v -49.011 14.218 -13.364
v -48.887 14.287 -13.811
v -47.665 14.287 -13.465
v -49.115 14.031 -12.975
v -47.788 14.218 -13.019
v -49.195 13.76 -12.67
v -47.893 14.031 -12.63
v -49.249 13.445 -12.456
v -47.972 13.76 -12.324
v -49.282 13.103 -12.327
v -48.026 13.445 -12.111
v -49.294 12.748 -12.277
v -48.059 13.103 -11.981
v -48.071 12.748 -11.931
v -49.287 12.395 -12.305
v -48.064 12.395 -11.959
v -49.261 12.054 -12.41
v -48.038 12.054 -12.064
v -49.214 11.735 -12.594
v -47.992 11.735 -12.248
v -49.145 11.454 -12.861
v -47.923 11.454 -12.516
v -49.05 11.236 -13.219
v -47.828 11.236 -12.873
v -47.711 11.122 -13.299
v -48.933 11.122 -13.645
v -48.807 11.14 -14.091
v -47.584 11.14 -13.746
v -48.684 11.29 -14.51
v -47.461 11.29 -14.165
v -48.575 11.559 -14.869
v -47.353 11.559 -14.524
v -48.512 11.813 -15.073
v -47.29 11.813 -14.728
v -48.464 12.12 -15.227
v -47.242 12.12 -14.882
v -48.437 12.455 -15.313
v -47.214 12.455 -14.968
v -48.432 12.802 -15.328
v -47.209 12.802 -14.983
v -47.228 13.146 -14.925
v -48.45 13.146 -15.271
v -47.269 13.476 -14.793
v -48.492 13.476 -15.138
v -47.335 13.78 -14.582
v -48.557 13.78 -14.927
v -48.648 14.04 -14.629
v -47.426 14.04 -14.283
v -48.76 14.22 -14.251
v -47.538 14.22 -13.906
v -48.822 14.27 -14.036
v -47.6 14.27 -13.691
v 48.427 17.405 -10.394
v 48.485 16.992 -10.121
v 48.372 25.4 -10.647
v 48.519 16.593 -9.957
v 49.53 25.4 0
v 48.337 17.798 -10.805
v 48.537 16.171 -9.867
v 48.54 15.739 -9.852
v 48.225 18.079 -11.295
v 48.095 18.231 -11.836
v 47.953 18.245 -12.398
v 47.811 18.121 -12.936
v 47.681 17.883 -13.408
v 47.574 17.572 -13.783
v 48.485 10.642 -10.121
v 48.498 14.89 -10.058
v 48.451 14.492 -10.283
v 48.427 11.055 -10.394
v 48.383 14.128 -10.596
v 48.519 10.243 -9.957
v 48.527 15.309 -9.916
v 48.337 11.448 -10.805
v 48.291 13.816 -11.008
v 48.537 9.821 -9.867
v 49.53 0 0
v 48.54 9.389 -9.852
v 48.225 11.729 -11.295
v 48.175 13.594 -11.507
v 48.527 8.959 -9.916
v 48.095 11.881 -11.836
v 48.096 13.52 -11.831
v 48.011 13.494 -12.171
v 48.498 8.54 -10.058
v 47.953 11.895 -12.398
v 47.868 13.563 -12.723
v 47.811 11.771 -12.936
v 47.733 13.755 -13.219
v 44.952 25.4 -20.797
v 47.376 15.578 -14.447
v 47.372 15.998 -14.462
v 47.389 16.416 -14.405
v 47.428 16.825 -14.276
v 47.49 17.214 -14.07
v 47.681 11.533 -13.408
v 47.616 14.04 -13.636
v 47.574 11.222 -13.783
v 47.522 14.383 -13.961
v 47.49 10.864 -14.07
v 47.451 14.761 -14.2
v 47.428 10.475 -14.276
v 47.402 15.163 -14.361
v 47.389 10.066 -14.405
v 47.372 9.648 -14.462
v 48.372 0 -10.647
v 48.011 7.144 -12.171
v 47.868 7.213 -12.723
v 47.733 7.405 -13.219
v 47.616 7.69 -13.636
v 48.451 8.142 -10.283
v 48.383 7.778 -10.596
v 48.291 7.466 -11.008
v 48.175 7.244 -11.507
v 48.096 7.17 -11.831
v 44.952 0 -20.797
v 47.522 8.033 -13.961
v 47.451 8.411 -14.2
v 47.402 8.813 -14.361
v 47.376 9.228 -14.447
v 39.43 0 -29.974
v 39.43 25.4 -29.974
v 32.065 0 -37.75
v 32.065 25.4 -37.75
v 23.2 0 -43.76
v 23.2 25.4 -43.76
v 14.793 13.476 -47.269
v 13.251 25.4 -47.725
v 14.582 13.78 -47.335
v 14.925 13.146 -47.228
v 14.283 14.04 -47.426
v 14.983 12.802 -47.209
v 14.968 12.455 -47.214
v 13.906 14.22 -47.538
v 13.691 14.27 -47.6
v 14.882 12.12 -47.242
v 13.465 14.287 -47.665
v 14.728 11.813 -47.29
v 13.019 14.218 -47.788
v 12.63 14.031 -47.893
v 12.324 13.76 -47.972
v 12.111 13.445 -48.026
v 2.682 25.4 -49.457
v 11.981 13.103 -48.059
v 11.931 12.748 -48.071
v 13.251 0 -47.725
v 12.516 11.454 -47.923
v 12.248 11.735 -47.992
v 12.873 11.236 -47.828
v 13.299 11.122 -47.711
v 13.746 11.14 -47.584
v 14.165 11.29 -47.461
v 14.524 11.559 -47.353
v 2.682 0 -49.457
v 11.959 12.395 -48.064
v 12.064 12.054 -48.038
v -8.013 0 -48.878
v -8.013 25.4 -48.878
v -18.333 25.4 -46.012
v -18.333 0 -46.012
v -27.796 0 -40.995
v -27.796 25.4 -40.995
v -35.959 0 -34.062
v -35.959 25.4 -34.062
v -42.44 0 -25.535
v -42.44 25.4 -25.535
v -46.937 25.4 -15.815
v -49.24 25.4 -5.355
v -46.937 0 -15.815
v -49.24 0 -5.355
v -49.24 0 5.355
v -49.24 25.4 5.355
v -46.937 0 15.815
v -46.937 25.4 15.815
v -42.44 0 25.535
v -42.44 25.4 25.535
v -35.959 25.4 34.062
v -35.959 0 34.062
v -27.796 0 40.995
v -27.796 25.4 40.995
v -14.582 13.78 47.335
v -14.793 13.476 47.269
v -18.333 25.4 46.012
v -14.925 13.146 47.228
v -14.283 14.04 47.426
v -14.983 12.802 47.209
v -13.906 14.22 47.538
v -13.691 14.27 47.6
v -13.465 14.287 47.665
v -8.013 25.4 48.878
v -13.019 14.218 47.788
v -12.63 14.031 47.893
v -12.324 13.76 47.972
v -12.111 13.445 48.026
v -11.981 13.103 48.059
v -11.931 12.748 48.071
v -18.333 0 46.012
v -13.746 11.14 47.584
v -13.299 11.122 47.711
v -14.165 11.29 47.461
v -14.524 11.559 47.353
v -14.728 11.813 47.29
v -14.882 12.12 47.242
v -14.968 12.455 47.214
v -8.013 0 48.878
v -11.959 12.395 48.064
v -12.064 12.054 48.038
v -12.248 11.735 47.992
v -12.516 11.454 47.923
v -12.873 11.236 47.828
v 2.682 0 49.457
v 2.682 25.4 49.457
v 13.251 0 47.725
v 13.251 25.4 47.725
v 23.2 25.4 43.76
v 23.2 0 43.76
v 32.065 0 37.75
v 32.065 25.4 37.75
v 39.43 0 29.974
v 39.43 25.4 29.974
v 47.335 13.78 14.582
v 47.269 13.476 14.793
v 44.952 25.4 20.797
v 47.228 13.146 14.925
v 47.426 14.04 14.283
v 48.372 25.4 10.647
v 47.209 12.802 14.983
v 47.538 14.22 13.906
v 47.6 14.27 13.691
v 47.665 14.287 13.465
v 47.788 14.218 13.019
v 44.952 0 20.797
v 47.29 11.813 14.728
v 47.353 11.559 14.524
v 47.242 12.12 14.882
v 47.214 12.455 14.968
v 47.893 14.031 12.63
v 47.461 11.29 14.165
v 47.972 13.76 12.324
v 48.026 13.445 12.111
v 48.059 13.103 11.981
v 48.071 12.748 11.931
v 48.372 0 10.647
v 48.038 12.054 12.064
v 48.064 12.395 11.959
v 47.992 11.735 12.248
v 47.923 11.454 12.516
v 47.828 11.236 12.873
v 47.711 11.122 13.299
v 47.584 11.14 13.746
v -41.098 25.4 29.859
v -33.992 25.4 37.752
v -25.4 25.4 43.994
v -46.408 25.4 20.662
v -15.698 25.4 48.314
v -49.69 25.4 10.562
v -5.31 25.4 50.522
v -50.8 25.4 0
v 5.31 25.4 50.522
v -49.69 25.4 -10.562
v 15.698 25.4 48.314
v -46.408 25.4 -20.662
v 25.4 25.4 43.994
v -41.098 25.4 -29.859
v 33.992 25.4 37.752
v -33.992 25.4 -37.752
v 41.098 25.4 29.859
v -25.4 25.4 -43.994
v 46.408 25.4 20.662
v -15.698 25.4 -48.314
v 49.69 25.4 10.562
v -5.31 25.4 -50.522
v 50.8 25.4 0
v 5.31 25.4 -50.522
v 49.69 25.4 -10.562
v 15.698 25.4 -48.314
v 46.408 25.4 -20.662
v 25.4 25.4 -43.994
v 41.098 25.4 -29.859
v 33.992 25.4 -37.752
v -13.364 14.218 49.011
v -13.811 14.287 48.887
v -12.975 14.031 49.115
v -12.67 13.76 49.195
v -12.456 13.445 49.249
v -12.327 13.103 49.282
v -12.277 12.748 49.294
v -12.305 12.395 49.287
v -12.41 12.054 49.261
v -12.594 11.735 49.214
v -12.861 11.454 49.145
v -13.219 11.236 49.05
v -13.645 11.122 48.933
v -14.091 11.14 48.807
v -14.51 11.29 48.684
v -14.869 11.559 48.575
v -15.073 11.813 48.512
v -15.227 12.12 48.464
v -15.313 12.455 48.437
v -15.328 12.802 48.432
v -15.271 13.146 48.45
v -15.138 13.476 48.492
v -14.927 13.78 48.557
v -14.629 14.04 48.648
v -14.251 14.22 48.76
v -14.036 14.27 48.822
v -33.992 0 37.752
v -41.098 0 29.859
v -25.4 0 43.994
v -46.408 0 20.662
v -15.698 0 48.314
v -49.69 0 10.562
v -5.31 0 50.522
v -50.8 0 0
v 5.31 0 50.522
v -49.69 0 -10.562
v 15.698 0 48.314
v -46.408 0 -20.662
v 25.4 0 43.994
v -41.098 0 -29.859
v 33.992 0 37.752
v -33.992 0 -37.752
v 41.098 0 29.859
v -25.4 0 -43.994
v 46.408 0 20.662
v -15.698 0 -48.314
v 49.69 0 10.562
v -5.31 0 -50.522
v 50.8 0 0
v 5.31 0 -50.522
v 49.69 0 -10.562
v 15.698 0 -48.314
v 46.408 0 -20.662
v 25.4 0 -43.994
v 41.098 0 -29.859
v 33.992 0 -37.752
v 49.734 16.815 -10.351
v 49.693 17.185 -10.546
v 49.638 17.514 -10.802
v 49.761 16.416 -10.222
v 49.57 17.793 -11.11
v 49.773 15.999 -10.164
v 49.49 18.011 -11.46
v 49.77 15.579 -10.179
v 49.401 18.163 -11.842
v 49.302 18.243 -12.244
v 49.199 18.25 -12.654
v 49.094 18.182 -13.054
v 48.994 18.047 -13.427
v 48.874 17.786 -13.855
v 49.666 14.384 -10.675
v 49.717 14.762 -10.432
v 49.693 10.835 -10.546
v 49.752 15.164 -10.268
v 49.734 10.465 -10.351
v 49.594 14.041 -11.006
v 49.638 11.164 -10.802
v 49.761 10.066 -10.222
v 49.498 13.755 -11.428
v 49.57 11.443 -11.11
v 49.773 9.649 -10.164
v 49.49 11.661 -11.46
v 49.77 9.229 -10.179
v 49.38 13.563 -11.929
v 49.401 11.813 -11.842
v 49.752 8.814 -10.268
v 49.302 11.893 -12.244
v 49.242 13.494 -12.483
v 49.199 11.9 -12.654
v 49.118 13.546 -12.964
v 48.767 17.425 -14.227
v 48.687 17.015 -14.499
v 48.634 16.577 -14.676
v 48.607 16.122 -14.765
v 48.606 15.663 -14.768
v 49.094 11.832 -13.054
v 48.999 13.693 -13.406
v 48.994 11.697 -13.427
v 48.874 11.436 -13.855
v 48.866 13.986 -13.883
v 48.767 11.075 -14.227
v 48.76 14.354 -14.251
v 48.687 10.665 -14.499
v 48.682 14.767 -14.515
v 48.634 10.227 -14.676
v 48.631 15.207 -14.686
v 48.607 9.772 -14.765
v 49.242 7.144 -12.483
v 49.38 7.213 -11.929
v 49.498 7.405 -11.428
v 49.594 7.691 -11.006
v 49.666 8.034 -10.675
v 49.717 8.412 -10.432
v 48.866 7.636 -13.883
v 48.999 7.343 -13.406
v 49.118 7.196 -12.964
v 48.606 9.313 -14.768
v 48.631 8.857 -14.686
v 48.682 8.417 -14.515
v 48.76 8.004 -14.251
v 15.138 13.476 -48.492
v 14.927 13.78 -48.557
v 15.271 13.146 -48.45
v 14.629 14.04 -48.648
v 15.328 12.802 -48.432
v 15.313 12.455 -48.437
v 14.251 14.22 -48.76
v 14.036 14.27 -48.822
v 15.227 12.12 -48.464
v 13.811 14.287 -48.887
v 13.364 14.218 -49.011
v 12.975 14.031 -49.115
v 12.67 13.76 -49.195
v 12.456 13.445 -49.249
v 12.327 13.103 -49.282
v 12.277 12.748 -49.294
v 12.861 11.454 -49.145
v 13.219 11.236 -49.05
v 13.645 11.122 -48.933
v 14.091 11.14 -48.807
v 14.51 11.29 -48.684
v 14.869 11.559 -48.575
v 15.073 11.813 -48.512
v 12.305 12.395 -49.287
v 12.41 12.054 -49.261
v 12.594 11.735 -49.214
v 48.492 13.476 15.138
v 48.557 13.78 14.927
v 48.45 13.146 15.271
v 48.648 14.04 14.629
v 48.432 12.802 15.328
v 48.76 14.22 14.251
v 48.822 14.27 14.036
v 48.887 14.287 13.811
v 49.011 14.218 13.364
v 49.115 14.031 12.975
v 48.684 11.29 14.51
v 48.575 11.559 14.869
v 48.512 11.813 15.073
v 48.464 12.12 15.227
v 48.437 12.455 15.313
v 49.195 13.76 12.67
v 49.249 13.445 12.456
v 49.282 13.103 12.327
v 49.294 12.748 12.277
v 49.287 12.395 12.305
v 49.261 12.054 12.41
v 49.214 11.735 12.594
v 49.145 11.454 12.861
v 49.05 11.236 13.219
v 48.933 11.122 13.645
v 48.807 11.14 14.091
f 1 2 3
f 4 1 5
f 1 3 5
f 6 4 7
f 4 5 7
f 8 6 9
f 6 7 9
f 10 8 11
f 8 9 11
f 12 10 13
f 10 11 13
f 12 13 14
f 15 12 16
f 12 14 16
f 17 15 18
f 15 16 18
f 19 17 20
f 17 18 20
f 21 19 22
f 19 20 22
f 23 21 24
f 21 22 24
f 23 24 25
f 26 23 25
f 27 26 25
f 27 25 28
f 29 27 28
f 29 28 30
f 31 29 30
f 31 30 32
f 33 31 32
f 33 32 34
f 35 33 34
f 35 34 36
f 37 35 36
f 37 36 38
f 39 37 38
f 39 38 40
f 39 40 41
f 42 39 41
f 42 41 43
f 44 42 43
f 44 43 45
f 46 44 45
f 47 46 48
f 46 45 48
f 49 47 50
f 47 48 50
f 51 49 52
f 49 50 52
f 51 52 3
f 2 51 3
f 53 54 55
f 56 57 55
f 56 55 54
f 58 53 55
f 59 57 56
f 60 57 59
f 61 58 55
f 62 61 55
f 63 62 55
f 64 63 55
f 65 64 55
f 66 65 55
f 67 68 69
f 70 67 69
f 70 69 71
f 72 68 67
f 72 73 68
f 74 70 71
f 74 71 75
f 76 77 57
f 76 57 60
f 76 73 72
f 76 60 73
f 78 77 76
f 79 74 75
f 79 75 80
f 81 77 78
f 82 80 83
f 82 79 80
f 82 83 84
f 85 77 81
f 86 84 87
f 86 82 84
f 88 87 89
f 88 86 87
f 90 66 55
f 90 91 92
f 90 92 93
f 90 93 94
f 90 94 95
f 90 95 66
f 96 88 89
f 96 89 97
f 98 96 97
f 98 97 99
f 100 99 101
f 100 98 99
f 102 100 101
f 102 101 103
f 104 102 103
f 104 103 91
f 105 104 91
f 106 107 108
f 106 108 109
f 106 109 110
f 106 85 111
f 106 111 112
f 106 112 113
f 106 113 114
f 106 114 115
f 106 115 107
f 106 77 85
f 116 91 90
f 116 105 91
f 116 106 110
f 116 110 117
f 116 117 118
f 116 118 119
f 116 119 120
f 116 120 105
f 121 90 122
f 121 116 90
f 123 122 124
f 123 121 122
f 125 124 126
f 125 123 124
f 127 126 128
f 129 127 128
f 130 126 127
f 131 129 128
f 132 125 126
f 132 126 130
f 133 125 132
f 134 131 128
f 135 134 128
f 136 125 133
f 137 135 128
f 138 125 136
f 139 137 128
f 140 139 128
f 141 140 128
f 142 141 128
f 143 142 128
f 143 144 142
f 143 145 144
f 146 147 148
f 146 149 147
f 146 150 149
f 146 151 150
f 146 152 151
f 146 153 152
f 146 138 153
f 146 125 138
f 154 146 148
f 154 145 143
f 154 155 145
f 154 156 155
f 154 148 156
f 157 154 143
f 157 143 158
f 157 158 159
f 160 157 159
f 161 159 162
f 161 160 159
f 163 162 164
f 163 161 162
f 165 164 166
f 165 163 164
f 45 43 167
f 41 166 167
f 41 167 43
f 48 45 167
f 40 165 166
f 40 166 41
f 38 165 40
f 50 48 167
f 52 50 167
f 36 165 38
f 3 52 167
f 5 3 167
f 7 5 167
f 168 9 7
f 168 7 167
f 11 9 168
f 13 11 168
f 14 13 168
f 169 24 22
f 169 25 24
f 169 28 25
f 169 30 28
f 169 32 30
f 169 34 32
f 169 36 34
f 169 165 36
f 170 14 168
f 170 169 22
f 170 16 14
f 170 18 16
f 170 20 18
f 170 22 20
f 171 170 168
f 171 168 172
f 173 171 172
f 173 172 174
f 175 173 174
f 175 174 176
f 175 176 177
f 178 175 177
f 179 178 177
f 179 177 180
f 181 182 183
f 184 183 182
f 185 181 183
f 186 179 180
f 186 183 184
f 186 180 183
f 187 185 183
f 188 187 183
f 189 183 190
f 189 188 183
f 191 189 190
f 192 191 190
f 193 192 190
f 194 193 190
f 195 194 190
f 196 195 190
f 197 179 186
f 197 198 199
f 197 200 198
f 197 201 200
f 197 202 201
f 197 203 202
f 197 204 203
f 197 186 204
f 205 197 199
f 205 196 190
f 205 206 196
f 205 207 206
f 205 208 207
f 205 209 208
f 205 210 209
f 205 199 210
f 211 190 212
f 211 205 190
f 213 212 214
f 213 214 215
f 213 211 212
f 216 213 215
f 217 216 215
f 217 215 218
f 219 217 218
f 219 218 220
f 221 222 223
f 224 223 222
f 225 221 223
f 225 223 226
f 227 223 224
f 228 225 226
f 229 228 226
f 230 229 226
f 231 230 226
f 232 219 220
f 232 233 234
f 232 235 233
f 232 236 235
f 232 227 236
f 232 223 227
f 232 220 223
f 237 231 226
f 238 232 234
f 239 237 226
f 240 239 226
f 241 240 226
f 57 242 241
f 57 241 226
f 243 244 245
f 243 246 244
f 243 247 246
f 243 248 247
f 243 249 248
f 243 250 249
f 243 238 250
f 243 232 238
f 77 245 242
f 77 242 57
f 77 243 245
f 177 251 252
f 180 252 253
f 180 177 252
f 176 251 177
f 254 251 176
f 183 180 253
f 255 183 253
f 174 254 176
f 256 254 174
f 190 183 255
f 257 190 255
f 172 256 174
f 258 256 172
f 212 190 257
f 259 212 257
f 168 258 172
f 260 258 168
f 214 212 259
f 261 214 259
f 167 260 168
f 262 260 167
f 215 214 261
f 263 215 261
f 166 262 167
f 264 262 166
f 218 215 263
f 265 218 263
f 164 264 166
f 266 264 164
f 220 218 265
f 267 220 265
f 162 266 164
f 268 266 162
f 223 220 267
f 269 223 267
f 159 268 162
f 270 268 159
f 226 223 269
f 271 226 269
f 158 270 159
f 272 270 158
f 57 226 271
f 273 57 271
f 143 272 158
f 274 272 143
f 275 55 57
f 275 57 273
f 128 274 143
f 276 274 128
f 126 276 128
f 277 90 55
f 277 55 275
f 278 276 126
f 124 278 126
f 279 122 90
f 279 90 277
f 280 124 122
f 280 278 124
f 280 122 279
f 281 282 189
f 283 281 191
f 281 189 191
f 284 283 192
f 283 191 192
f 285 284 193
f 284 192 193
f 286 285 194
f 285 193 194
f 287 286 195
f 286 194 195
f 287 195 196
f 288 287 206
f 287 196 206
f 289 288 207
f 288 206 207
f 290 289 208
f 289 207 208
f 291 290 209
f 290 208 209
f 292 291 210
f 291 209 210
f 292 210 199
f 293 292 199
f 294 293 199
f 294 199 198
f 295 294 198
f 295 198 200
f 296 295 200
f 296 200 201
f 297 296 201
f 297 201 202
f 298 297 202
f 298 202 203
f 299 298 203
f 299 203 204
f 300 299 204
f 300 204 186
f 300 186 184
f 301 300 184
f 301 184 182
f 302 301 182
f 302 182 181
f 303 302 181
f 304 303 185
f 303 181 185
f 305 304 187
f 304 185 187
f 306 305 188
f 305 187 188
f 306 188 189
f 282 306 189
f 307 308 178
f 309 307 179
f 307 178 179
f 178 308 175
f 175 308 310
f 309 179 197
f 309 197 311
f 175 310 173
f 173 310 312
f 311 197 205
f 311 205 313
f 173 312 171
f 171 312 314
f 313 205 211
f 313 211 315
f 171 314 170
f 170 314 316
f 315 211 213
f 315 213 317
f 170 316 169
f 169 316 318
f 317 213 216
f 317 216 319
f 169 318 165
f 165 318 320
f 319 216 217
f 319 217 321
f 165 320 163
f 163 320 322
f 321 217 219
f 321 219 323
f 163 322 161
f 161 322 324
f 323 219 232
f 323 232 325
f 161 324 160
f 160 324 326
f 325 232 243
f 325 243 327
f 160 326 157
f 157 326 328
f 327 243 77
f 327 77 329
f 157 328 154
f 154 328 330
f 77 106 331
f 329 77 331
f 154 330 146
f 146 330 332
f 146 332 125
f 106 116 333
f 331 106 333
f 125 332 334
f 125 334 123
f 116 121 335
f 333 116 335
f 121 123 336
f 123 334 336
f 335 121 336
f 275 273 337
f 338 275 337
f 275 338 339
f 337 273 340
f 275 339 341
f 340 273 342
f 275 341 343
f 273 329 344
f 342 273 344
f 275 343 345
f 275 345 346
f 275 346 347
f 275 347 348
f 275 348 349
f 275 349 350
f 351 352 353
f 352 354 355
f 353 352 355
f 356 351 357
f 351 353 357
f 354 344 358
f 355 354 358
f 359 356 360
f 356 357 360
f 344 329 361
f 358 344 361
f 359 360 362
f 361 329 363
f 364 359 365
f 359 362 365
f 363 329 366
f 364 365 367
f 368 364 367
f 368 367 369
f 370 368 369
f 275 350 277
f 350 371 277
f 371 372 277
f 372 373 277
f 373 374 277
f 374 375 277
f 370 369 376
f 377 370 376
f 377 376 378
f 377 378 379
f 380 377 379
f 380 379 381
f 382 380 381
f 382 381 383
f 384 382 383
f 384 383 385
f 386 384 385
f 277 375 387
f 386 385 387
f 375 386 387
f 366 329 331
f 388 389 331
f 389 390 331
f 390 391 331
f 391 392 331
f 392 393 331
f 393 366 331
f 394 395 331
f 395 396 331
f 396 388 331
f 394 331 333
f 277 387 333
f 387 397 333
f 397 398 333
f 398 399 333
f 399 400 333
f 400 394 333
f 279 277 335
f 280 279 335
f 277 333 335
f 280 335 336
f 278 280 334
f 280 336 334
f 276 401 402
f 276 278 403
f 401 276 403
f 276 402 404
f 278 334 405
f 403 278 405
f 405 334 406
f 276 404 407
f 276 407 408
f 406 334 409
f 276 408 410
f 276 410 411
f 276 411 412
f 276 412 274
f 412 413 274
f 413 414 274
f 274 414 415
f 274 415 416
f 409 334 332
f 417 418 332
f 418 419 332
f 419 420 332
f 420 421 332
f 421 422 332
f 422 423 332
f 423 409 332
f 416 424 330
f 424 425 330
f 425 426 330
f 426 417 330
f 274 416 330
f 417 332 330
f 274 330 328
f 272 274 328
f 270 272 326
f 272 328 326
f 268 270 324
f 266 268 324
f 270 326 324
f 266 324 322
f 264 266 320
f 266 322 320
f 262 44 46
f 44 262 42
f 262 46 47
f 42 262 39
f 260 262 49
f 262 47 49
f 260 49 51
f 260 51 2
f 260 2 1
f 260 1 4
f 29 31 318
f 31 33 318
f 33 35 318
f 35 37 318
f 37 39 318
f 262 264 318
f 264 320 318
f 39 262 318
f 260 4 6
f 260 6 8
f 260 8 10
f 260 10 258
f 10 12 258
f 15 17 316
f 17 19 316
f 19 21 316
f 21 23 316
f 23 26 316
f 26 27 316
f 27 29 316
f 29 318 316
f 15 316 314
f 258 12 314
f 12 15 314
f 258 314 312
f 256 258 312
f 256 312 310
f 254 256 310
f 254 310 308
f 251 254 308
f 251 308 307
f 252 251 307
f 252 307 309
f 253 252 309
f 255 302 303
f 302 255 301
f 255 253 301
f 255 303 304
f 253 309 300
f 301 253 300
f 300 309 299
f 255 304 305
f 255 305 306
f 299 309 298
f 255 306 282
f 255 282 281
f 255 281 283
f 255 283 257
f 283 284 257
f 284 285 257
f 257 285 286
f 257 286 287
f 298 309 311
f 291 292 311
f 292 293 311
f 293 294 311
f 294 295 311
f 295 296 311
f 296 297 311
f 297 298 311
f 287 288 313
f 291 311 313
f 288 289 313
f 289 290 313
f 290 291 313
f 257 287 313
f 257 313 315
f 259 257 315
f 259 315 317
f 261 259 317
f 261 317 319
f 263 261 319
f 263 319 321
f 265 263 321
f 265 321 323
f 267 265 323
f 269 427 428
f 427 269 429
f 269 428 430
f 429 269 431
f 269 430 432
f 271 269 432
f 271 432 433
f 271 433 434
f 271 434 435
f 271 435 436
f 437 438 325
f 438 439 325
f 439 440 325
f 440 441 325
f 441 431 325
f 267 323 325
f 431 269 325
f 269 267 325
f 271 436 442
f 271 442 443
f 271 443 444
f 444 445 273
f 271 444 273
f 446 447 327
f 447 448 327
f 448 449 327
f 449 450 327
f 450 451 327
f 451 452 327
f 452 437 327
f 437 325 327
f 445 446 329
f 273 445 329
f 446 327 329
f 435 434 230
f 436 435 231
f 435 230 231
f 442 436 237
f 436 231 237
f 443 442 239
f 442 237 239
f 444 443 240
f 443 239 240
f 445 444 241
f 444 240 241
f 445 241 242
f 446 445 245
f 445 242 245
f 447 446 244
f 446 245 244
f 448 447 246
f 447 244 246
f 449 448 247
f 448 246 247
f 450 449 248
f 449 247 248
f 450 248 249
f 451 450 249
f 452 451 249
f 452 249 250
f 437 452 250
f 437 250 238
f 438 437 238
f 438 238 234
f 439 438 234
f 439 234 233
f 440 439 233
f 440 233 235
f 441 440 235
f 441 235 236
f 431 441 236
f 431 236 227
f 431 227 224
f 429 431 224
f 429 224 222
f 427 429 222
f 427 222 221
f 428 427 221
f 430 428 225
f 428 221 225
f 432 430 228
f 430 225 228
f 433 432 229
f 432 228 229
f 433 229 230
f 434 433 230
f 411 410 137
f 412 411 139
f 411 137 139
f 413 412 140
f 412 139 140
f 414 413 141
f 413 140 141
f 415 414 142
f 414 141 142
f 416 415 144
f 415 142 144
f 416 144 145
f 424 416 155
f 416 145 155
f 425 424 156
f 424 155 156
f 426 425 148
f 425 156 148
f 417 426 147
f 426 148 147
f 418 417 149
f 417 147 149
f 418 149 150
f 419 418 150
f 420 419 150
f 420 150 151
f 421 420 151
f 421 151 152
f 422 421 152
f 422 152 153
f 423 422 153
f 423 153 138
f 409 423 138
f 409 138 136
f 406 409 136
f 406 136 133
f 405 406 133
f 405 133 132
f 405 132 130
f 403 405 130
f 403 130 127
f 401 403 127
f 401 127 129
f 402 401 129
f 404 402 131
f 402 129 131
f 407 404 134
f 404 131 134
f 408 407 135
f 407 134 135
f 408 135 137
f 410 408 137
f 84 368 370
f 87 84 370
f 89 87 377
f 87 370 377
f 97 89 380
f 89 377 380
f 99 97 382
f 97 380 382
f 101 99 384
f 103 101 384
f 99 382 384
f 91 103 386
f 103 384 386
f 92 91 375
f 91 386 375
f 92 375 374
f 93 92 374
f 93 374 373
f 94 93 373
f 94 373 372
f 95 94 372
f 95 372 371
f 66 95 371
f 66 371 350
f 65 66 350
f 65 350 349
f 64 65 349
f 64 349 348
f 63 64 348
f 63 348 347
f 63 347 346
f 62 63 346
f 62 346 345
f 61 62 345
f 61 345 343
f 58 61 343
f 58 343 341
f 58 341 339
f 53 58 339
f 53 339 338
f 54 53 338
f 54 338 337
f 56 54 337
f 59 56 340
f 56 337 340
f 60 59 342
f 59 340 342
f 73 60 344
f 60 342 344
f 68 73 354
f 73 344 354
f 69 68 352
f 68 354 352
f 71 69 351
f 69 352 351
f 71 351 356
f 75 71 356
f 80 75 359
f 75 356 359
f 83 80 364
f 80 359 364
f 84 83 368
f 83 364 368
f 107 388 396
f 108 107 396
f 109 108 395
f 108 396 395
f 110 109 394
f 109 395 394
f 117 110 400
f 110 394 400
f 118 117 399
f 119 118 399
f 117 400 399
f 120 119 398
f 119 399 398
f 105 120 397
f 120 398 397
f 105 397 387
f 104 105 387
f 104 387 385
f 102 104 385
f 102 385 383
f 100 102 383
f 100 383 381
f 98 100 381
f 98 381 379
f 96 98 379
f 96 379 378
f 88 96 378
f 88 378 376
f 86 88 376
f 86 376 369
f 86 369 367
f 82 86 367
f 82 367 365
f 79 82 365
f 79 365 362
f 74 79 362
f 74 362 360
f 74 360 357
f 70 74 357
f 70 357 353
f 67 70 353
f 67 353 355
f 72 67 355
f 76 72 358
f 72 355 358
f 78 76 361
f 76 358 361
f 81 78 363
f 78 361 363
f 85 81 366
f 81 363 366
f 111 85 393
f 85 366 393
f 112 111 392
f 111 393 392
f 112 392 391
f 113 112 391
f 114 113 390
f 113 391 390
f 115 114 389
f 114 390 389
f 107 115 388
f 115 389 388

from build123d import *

# Parameters (mm, degrees)
SKETCH1_R           = 50.8
SKETCH1_R_2         = 49.53
BOSS_EXTRUDE1_DEPTH = 25.4
SKETCH2_R           = 2.38125
CUT_EXTRUDE1_DEPTH  = 25.4
SKETCH3_R           = 1.5875
CUT_EXTRUDE2_DEPTH  = 37.338
CIRPATTERN1_COUNT   = 4


with BuildPart() as part:
    # Sketch1 → Boss-Extrude1 (new body)
    with BuildSketch(Plane(origin=(0, 0, 0), x_dir=(1, 0, 0), z_dir=(0, 1, 0))):
        Circle(SKETCH1_R)
        Circle(SKETCH1_R_2, mode=Mode.SUBTRACT)
    extrude(amount=BOSS_EXTRUDE1_DEPTH)

    # Sketch2 → Cut-Extrude1 (cut)
    with BuildSketch(Plane(origin=(80.709285485, 206.333156205, 111.645979585), x_dir=(0, -1, 0), z_dir=(0.969338628, 0, -0.24572876))):
        with Locations((196.808156205, 128.055353348)):
            Circle(SKETCH2_R)
        with Locations((190.458156205, 128.055353348)):
            Circle(SKETCH2_R)
    extrude(amount=-CUT_EXTRUDE1_DEPTH, mode=Mode.SUBTRACT)

    # Sketch3 → Cut-Extrude2 (cut)
    with BuildSketch(Plane(origin=(-3.10026152, 207.778194099, 134.798971935), x_dir=(0, 1, 0), z_dir=(-0.962336257, 0, -0.271861966))):
        with Locations((-195.078194099, 130.56478129)):
            Circle(SKETCH3_R)
    cut_extrude2 = extrude(amount=-CUT_EXTRUDE2_DEPTH, mode=Mode.SUBTRACT)

    # CirPattern1: Cut-Extrude2 ×4 about axis
    cirpattern1_axis = Axis((0, 0, 0), (0, -1, 0))
    for i in range(1, CIRPATTERN1_COUNT):
        add(cut_extrude2.rotate(cirpattern1_axis, i * 360 / CIRPATTERN1_COUNT), mode=Mode.SUBTRACT)


solid = part.part
